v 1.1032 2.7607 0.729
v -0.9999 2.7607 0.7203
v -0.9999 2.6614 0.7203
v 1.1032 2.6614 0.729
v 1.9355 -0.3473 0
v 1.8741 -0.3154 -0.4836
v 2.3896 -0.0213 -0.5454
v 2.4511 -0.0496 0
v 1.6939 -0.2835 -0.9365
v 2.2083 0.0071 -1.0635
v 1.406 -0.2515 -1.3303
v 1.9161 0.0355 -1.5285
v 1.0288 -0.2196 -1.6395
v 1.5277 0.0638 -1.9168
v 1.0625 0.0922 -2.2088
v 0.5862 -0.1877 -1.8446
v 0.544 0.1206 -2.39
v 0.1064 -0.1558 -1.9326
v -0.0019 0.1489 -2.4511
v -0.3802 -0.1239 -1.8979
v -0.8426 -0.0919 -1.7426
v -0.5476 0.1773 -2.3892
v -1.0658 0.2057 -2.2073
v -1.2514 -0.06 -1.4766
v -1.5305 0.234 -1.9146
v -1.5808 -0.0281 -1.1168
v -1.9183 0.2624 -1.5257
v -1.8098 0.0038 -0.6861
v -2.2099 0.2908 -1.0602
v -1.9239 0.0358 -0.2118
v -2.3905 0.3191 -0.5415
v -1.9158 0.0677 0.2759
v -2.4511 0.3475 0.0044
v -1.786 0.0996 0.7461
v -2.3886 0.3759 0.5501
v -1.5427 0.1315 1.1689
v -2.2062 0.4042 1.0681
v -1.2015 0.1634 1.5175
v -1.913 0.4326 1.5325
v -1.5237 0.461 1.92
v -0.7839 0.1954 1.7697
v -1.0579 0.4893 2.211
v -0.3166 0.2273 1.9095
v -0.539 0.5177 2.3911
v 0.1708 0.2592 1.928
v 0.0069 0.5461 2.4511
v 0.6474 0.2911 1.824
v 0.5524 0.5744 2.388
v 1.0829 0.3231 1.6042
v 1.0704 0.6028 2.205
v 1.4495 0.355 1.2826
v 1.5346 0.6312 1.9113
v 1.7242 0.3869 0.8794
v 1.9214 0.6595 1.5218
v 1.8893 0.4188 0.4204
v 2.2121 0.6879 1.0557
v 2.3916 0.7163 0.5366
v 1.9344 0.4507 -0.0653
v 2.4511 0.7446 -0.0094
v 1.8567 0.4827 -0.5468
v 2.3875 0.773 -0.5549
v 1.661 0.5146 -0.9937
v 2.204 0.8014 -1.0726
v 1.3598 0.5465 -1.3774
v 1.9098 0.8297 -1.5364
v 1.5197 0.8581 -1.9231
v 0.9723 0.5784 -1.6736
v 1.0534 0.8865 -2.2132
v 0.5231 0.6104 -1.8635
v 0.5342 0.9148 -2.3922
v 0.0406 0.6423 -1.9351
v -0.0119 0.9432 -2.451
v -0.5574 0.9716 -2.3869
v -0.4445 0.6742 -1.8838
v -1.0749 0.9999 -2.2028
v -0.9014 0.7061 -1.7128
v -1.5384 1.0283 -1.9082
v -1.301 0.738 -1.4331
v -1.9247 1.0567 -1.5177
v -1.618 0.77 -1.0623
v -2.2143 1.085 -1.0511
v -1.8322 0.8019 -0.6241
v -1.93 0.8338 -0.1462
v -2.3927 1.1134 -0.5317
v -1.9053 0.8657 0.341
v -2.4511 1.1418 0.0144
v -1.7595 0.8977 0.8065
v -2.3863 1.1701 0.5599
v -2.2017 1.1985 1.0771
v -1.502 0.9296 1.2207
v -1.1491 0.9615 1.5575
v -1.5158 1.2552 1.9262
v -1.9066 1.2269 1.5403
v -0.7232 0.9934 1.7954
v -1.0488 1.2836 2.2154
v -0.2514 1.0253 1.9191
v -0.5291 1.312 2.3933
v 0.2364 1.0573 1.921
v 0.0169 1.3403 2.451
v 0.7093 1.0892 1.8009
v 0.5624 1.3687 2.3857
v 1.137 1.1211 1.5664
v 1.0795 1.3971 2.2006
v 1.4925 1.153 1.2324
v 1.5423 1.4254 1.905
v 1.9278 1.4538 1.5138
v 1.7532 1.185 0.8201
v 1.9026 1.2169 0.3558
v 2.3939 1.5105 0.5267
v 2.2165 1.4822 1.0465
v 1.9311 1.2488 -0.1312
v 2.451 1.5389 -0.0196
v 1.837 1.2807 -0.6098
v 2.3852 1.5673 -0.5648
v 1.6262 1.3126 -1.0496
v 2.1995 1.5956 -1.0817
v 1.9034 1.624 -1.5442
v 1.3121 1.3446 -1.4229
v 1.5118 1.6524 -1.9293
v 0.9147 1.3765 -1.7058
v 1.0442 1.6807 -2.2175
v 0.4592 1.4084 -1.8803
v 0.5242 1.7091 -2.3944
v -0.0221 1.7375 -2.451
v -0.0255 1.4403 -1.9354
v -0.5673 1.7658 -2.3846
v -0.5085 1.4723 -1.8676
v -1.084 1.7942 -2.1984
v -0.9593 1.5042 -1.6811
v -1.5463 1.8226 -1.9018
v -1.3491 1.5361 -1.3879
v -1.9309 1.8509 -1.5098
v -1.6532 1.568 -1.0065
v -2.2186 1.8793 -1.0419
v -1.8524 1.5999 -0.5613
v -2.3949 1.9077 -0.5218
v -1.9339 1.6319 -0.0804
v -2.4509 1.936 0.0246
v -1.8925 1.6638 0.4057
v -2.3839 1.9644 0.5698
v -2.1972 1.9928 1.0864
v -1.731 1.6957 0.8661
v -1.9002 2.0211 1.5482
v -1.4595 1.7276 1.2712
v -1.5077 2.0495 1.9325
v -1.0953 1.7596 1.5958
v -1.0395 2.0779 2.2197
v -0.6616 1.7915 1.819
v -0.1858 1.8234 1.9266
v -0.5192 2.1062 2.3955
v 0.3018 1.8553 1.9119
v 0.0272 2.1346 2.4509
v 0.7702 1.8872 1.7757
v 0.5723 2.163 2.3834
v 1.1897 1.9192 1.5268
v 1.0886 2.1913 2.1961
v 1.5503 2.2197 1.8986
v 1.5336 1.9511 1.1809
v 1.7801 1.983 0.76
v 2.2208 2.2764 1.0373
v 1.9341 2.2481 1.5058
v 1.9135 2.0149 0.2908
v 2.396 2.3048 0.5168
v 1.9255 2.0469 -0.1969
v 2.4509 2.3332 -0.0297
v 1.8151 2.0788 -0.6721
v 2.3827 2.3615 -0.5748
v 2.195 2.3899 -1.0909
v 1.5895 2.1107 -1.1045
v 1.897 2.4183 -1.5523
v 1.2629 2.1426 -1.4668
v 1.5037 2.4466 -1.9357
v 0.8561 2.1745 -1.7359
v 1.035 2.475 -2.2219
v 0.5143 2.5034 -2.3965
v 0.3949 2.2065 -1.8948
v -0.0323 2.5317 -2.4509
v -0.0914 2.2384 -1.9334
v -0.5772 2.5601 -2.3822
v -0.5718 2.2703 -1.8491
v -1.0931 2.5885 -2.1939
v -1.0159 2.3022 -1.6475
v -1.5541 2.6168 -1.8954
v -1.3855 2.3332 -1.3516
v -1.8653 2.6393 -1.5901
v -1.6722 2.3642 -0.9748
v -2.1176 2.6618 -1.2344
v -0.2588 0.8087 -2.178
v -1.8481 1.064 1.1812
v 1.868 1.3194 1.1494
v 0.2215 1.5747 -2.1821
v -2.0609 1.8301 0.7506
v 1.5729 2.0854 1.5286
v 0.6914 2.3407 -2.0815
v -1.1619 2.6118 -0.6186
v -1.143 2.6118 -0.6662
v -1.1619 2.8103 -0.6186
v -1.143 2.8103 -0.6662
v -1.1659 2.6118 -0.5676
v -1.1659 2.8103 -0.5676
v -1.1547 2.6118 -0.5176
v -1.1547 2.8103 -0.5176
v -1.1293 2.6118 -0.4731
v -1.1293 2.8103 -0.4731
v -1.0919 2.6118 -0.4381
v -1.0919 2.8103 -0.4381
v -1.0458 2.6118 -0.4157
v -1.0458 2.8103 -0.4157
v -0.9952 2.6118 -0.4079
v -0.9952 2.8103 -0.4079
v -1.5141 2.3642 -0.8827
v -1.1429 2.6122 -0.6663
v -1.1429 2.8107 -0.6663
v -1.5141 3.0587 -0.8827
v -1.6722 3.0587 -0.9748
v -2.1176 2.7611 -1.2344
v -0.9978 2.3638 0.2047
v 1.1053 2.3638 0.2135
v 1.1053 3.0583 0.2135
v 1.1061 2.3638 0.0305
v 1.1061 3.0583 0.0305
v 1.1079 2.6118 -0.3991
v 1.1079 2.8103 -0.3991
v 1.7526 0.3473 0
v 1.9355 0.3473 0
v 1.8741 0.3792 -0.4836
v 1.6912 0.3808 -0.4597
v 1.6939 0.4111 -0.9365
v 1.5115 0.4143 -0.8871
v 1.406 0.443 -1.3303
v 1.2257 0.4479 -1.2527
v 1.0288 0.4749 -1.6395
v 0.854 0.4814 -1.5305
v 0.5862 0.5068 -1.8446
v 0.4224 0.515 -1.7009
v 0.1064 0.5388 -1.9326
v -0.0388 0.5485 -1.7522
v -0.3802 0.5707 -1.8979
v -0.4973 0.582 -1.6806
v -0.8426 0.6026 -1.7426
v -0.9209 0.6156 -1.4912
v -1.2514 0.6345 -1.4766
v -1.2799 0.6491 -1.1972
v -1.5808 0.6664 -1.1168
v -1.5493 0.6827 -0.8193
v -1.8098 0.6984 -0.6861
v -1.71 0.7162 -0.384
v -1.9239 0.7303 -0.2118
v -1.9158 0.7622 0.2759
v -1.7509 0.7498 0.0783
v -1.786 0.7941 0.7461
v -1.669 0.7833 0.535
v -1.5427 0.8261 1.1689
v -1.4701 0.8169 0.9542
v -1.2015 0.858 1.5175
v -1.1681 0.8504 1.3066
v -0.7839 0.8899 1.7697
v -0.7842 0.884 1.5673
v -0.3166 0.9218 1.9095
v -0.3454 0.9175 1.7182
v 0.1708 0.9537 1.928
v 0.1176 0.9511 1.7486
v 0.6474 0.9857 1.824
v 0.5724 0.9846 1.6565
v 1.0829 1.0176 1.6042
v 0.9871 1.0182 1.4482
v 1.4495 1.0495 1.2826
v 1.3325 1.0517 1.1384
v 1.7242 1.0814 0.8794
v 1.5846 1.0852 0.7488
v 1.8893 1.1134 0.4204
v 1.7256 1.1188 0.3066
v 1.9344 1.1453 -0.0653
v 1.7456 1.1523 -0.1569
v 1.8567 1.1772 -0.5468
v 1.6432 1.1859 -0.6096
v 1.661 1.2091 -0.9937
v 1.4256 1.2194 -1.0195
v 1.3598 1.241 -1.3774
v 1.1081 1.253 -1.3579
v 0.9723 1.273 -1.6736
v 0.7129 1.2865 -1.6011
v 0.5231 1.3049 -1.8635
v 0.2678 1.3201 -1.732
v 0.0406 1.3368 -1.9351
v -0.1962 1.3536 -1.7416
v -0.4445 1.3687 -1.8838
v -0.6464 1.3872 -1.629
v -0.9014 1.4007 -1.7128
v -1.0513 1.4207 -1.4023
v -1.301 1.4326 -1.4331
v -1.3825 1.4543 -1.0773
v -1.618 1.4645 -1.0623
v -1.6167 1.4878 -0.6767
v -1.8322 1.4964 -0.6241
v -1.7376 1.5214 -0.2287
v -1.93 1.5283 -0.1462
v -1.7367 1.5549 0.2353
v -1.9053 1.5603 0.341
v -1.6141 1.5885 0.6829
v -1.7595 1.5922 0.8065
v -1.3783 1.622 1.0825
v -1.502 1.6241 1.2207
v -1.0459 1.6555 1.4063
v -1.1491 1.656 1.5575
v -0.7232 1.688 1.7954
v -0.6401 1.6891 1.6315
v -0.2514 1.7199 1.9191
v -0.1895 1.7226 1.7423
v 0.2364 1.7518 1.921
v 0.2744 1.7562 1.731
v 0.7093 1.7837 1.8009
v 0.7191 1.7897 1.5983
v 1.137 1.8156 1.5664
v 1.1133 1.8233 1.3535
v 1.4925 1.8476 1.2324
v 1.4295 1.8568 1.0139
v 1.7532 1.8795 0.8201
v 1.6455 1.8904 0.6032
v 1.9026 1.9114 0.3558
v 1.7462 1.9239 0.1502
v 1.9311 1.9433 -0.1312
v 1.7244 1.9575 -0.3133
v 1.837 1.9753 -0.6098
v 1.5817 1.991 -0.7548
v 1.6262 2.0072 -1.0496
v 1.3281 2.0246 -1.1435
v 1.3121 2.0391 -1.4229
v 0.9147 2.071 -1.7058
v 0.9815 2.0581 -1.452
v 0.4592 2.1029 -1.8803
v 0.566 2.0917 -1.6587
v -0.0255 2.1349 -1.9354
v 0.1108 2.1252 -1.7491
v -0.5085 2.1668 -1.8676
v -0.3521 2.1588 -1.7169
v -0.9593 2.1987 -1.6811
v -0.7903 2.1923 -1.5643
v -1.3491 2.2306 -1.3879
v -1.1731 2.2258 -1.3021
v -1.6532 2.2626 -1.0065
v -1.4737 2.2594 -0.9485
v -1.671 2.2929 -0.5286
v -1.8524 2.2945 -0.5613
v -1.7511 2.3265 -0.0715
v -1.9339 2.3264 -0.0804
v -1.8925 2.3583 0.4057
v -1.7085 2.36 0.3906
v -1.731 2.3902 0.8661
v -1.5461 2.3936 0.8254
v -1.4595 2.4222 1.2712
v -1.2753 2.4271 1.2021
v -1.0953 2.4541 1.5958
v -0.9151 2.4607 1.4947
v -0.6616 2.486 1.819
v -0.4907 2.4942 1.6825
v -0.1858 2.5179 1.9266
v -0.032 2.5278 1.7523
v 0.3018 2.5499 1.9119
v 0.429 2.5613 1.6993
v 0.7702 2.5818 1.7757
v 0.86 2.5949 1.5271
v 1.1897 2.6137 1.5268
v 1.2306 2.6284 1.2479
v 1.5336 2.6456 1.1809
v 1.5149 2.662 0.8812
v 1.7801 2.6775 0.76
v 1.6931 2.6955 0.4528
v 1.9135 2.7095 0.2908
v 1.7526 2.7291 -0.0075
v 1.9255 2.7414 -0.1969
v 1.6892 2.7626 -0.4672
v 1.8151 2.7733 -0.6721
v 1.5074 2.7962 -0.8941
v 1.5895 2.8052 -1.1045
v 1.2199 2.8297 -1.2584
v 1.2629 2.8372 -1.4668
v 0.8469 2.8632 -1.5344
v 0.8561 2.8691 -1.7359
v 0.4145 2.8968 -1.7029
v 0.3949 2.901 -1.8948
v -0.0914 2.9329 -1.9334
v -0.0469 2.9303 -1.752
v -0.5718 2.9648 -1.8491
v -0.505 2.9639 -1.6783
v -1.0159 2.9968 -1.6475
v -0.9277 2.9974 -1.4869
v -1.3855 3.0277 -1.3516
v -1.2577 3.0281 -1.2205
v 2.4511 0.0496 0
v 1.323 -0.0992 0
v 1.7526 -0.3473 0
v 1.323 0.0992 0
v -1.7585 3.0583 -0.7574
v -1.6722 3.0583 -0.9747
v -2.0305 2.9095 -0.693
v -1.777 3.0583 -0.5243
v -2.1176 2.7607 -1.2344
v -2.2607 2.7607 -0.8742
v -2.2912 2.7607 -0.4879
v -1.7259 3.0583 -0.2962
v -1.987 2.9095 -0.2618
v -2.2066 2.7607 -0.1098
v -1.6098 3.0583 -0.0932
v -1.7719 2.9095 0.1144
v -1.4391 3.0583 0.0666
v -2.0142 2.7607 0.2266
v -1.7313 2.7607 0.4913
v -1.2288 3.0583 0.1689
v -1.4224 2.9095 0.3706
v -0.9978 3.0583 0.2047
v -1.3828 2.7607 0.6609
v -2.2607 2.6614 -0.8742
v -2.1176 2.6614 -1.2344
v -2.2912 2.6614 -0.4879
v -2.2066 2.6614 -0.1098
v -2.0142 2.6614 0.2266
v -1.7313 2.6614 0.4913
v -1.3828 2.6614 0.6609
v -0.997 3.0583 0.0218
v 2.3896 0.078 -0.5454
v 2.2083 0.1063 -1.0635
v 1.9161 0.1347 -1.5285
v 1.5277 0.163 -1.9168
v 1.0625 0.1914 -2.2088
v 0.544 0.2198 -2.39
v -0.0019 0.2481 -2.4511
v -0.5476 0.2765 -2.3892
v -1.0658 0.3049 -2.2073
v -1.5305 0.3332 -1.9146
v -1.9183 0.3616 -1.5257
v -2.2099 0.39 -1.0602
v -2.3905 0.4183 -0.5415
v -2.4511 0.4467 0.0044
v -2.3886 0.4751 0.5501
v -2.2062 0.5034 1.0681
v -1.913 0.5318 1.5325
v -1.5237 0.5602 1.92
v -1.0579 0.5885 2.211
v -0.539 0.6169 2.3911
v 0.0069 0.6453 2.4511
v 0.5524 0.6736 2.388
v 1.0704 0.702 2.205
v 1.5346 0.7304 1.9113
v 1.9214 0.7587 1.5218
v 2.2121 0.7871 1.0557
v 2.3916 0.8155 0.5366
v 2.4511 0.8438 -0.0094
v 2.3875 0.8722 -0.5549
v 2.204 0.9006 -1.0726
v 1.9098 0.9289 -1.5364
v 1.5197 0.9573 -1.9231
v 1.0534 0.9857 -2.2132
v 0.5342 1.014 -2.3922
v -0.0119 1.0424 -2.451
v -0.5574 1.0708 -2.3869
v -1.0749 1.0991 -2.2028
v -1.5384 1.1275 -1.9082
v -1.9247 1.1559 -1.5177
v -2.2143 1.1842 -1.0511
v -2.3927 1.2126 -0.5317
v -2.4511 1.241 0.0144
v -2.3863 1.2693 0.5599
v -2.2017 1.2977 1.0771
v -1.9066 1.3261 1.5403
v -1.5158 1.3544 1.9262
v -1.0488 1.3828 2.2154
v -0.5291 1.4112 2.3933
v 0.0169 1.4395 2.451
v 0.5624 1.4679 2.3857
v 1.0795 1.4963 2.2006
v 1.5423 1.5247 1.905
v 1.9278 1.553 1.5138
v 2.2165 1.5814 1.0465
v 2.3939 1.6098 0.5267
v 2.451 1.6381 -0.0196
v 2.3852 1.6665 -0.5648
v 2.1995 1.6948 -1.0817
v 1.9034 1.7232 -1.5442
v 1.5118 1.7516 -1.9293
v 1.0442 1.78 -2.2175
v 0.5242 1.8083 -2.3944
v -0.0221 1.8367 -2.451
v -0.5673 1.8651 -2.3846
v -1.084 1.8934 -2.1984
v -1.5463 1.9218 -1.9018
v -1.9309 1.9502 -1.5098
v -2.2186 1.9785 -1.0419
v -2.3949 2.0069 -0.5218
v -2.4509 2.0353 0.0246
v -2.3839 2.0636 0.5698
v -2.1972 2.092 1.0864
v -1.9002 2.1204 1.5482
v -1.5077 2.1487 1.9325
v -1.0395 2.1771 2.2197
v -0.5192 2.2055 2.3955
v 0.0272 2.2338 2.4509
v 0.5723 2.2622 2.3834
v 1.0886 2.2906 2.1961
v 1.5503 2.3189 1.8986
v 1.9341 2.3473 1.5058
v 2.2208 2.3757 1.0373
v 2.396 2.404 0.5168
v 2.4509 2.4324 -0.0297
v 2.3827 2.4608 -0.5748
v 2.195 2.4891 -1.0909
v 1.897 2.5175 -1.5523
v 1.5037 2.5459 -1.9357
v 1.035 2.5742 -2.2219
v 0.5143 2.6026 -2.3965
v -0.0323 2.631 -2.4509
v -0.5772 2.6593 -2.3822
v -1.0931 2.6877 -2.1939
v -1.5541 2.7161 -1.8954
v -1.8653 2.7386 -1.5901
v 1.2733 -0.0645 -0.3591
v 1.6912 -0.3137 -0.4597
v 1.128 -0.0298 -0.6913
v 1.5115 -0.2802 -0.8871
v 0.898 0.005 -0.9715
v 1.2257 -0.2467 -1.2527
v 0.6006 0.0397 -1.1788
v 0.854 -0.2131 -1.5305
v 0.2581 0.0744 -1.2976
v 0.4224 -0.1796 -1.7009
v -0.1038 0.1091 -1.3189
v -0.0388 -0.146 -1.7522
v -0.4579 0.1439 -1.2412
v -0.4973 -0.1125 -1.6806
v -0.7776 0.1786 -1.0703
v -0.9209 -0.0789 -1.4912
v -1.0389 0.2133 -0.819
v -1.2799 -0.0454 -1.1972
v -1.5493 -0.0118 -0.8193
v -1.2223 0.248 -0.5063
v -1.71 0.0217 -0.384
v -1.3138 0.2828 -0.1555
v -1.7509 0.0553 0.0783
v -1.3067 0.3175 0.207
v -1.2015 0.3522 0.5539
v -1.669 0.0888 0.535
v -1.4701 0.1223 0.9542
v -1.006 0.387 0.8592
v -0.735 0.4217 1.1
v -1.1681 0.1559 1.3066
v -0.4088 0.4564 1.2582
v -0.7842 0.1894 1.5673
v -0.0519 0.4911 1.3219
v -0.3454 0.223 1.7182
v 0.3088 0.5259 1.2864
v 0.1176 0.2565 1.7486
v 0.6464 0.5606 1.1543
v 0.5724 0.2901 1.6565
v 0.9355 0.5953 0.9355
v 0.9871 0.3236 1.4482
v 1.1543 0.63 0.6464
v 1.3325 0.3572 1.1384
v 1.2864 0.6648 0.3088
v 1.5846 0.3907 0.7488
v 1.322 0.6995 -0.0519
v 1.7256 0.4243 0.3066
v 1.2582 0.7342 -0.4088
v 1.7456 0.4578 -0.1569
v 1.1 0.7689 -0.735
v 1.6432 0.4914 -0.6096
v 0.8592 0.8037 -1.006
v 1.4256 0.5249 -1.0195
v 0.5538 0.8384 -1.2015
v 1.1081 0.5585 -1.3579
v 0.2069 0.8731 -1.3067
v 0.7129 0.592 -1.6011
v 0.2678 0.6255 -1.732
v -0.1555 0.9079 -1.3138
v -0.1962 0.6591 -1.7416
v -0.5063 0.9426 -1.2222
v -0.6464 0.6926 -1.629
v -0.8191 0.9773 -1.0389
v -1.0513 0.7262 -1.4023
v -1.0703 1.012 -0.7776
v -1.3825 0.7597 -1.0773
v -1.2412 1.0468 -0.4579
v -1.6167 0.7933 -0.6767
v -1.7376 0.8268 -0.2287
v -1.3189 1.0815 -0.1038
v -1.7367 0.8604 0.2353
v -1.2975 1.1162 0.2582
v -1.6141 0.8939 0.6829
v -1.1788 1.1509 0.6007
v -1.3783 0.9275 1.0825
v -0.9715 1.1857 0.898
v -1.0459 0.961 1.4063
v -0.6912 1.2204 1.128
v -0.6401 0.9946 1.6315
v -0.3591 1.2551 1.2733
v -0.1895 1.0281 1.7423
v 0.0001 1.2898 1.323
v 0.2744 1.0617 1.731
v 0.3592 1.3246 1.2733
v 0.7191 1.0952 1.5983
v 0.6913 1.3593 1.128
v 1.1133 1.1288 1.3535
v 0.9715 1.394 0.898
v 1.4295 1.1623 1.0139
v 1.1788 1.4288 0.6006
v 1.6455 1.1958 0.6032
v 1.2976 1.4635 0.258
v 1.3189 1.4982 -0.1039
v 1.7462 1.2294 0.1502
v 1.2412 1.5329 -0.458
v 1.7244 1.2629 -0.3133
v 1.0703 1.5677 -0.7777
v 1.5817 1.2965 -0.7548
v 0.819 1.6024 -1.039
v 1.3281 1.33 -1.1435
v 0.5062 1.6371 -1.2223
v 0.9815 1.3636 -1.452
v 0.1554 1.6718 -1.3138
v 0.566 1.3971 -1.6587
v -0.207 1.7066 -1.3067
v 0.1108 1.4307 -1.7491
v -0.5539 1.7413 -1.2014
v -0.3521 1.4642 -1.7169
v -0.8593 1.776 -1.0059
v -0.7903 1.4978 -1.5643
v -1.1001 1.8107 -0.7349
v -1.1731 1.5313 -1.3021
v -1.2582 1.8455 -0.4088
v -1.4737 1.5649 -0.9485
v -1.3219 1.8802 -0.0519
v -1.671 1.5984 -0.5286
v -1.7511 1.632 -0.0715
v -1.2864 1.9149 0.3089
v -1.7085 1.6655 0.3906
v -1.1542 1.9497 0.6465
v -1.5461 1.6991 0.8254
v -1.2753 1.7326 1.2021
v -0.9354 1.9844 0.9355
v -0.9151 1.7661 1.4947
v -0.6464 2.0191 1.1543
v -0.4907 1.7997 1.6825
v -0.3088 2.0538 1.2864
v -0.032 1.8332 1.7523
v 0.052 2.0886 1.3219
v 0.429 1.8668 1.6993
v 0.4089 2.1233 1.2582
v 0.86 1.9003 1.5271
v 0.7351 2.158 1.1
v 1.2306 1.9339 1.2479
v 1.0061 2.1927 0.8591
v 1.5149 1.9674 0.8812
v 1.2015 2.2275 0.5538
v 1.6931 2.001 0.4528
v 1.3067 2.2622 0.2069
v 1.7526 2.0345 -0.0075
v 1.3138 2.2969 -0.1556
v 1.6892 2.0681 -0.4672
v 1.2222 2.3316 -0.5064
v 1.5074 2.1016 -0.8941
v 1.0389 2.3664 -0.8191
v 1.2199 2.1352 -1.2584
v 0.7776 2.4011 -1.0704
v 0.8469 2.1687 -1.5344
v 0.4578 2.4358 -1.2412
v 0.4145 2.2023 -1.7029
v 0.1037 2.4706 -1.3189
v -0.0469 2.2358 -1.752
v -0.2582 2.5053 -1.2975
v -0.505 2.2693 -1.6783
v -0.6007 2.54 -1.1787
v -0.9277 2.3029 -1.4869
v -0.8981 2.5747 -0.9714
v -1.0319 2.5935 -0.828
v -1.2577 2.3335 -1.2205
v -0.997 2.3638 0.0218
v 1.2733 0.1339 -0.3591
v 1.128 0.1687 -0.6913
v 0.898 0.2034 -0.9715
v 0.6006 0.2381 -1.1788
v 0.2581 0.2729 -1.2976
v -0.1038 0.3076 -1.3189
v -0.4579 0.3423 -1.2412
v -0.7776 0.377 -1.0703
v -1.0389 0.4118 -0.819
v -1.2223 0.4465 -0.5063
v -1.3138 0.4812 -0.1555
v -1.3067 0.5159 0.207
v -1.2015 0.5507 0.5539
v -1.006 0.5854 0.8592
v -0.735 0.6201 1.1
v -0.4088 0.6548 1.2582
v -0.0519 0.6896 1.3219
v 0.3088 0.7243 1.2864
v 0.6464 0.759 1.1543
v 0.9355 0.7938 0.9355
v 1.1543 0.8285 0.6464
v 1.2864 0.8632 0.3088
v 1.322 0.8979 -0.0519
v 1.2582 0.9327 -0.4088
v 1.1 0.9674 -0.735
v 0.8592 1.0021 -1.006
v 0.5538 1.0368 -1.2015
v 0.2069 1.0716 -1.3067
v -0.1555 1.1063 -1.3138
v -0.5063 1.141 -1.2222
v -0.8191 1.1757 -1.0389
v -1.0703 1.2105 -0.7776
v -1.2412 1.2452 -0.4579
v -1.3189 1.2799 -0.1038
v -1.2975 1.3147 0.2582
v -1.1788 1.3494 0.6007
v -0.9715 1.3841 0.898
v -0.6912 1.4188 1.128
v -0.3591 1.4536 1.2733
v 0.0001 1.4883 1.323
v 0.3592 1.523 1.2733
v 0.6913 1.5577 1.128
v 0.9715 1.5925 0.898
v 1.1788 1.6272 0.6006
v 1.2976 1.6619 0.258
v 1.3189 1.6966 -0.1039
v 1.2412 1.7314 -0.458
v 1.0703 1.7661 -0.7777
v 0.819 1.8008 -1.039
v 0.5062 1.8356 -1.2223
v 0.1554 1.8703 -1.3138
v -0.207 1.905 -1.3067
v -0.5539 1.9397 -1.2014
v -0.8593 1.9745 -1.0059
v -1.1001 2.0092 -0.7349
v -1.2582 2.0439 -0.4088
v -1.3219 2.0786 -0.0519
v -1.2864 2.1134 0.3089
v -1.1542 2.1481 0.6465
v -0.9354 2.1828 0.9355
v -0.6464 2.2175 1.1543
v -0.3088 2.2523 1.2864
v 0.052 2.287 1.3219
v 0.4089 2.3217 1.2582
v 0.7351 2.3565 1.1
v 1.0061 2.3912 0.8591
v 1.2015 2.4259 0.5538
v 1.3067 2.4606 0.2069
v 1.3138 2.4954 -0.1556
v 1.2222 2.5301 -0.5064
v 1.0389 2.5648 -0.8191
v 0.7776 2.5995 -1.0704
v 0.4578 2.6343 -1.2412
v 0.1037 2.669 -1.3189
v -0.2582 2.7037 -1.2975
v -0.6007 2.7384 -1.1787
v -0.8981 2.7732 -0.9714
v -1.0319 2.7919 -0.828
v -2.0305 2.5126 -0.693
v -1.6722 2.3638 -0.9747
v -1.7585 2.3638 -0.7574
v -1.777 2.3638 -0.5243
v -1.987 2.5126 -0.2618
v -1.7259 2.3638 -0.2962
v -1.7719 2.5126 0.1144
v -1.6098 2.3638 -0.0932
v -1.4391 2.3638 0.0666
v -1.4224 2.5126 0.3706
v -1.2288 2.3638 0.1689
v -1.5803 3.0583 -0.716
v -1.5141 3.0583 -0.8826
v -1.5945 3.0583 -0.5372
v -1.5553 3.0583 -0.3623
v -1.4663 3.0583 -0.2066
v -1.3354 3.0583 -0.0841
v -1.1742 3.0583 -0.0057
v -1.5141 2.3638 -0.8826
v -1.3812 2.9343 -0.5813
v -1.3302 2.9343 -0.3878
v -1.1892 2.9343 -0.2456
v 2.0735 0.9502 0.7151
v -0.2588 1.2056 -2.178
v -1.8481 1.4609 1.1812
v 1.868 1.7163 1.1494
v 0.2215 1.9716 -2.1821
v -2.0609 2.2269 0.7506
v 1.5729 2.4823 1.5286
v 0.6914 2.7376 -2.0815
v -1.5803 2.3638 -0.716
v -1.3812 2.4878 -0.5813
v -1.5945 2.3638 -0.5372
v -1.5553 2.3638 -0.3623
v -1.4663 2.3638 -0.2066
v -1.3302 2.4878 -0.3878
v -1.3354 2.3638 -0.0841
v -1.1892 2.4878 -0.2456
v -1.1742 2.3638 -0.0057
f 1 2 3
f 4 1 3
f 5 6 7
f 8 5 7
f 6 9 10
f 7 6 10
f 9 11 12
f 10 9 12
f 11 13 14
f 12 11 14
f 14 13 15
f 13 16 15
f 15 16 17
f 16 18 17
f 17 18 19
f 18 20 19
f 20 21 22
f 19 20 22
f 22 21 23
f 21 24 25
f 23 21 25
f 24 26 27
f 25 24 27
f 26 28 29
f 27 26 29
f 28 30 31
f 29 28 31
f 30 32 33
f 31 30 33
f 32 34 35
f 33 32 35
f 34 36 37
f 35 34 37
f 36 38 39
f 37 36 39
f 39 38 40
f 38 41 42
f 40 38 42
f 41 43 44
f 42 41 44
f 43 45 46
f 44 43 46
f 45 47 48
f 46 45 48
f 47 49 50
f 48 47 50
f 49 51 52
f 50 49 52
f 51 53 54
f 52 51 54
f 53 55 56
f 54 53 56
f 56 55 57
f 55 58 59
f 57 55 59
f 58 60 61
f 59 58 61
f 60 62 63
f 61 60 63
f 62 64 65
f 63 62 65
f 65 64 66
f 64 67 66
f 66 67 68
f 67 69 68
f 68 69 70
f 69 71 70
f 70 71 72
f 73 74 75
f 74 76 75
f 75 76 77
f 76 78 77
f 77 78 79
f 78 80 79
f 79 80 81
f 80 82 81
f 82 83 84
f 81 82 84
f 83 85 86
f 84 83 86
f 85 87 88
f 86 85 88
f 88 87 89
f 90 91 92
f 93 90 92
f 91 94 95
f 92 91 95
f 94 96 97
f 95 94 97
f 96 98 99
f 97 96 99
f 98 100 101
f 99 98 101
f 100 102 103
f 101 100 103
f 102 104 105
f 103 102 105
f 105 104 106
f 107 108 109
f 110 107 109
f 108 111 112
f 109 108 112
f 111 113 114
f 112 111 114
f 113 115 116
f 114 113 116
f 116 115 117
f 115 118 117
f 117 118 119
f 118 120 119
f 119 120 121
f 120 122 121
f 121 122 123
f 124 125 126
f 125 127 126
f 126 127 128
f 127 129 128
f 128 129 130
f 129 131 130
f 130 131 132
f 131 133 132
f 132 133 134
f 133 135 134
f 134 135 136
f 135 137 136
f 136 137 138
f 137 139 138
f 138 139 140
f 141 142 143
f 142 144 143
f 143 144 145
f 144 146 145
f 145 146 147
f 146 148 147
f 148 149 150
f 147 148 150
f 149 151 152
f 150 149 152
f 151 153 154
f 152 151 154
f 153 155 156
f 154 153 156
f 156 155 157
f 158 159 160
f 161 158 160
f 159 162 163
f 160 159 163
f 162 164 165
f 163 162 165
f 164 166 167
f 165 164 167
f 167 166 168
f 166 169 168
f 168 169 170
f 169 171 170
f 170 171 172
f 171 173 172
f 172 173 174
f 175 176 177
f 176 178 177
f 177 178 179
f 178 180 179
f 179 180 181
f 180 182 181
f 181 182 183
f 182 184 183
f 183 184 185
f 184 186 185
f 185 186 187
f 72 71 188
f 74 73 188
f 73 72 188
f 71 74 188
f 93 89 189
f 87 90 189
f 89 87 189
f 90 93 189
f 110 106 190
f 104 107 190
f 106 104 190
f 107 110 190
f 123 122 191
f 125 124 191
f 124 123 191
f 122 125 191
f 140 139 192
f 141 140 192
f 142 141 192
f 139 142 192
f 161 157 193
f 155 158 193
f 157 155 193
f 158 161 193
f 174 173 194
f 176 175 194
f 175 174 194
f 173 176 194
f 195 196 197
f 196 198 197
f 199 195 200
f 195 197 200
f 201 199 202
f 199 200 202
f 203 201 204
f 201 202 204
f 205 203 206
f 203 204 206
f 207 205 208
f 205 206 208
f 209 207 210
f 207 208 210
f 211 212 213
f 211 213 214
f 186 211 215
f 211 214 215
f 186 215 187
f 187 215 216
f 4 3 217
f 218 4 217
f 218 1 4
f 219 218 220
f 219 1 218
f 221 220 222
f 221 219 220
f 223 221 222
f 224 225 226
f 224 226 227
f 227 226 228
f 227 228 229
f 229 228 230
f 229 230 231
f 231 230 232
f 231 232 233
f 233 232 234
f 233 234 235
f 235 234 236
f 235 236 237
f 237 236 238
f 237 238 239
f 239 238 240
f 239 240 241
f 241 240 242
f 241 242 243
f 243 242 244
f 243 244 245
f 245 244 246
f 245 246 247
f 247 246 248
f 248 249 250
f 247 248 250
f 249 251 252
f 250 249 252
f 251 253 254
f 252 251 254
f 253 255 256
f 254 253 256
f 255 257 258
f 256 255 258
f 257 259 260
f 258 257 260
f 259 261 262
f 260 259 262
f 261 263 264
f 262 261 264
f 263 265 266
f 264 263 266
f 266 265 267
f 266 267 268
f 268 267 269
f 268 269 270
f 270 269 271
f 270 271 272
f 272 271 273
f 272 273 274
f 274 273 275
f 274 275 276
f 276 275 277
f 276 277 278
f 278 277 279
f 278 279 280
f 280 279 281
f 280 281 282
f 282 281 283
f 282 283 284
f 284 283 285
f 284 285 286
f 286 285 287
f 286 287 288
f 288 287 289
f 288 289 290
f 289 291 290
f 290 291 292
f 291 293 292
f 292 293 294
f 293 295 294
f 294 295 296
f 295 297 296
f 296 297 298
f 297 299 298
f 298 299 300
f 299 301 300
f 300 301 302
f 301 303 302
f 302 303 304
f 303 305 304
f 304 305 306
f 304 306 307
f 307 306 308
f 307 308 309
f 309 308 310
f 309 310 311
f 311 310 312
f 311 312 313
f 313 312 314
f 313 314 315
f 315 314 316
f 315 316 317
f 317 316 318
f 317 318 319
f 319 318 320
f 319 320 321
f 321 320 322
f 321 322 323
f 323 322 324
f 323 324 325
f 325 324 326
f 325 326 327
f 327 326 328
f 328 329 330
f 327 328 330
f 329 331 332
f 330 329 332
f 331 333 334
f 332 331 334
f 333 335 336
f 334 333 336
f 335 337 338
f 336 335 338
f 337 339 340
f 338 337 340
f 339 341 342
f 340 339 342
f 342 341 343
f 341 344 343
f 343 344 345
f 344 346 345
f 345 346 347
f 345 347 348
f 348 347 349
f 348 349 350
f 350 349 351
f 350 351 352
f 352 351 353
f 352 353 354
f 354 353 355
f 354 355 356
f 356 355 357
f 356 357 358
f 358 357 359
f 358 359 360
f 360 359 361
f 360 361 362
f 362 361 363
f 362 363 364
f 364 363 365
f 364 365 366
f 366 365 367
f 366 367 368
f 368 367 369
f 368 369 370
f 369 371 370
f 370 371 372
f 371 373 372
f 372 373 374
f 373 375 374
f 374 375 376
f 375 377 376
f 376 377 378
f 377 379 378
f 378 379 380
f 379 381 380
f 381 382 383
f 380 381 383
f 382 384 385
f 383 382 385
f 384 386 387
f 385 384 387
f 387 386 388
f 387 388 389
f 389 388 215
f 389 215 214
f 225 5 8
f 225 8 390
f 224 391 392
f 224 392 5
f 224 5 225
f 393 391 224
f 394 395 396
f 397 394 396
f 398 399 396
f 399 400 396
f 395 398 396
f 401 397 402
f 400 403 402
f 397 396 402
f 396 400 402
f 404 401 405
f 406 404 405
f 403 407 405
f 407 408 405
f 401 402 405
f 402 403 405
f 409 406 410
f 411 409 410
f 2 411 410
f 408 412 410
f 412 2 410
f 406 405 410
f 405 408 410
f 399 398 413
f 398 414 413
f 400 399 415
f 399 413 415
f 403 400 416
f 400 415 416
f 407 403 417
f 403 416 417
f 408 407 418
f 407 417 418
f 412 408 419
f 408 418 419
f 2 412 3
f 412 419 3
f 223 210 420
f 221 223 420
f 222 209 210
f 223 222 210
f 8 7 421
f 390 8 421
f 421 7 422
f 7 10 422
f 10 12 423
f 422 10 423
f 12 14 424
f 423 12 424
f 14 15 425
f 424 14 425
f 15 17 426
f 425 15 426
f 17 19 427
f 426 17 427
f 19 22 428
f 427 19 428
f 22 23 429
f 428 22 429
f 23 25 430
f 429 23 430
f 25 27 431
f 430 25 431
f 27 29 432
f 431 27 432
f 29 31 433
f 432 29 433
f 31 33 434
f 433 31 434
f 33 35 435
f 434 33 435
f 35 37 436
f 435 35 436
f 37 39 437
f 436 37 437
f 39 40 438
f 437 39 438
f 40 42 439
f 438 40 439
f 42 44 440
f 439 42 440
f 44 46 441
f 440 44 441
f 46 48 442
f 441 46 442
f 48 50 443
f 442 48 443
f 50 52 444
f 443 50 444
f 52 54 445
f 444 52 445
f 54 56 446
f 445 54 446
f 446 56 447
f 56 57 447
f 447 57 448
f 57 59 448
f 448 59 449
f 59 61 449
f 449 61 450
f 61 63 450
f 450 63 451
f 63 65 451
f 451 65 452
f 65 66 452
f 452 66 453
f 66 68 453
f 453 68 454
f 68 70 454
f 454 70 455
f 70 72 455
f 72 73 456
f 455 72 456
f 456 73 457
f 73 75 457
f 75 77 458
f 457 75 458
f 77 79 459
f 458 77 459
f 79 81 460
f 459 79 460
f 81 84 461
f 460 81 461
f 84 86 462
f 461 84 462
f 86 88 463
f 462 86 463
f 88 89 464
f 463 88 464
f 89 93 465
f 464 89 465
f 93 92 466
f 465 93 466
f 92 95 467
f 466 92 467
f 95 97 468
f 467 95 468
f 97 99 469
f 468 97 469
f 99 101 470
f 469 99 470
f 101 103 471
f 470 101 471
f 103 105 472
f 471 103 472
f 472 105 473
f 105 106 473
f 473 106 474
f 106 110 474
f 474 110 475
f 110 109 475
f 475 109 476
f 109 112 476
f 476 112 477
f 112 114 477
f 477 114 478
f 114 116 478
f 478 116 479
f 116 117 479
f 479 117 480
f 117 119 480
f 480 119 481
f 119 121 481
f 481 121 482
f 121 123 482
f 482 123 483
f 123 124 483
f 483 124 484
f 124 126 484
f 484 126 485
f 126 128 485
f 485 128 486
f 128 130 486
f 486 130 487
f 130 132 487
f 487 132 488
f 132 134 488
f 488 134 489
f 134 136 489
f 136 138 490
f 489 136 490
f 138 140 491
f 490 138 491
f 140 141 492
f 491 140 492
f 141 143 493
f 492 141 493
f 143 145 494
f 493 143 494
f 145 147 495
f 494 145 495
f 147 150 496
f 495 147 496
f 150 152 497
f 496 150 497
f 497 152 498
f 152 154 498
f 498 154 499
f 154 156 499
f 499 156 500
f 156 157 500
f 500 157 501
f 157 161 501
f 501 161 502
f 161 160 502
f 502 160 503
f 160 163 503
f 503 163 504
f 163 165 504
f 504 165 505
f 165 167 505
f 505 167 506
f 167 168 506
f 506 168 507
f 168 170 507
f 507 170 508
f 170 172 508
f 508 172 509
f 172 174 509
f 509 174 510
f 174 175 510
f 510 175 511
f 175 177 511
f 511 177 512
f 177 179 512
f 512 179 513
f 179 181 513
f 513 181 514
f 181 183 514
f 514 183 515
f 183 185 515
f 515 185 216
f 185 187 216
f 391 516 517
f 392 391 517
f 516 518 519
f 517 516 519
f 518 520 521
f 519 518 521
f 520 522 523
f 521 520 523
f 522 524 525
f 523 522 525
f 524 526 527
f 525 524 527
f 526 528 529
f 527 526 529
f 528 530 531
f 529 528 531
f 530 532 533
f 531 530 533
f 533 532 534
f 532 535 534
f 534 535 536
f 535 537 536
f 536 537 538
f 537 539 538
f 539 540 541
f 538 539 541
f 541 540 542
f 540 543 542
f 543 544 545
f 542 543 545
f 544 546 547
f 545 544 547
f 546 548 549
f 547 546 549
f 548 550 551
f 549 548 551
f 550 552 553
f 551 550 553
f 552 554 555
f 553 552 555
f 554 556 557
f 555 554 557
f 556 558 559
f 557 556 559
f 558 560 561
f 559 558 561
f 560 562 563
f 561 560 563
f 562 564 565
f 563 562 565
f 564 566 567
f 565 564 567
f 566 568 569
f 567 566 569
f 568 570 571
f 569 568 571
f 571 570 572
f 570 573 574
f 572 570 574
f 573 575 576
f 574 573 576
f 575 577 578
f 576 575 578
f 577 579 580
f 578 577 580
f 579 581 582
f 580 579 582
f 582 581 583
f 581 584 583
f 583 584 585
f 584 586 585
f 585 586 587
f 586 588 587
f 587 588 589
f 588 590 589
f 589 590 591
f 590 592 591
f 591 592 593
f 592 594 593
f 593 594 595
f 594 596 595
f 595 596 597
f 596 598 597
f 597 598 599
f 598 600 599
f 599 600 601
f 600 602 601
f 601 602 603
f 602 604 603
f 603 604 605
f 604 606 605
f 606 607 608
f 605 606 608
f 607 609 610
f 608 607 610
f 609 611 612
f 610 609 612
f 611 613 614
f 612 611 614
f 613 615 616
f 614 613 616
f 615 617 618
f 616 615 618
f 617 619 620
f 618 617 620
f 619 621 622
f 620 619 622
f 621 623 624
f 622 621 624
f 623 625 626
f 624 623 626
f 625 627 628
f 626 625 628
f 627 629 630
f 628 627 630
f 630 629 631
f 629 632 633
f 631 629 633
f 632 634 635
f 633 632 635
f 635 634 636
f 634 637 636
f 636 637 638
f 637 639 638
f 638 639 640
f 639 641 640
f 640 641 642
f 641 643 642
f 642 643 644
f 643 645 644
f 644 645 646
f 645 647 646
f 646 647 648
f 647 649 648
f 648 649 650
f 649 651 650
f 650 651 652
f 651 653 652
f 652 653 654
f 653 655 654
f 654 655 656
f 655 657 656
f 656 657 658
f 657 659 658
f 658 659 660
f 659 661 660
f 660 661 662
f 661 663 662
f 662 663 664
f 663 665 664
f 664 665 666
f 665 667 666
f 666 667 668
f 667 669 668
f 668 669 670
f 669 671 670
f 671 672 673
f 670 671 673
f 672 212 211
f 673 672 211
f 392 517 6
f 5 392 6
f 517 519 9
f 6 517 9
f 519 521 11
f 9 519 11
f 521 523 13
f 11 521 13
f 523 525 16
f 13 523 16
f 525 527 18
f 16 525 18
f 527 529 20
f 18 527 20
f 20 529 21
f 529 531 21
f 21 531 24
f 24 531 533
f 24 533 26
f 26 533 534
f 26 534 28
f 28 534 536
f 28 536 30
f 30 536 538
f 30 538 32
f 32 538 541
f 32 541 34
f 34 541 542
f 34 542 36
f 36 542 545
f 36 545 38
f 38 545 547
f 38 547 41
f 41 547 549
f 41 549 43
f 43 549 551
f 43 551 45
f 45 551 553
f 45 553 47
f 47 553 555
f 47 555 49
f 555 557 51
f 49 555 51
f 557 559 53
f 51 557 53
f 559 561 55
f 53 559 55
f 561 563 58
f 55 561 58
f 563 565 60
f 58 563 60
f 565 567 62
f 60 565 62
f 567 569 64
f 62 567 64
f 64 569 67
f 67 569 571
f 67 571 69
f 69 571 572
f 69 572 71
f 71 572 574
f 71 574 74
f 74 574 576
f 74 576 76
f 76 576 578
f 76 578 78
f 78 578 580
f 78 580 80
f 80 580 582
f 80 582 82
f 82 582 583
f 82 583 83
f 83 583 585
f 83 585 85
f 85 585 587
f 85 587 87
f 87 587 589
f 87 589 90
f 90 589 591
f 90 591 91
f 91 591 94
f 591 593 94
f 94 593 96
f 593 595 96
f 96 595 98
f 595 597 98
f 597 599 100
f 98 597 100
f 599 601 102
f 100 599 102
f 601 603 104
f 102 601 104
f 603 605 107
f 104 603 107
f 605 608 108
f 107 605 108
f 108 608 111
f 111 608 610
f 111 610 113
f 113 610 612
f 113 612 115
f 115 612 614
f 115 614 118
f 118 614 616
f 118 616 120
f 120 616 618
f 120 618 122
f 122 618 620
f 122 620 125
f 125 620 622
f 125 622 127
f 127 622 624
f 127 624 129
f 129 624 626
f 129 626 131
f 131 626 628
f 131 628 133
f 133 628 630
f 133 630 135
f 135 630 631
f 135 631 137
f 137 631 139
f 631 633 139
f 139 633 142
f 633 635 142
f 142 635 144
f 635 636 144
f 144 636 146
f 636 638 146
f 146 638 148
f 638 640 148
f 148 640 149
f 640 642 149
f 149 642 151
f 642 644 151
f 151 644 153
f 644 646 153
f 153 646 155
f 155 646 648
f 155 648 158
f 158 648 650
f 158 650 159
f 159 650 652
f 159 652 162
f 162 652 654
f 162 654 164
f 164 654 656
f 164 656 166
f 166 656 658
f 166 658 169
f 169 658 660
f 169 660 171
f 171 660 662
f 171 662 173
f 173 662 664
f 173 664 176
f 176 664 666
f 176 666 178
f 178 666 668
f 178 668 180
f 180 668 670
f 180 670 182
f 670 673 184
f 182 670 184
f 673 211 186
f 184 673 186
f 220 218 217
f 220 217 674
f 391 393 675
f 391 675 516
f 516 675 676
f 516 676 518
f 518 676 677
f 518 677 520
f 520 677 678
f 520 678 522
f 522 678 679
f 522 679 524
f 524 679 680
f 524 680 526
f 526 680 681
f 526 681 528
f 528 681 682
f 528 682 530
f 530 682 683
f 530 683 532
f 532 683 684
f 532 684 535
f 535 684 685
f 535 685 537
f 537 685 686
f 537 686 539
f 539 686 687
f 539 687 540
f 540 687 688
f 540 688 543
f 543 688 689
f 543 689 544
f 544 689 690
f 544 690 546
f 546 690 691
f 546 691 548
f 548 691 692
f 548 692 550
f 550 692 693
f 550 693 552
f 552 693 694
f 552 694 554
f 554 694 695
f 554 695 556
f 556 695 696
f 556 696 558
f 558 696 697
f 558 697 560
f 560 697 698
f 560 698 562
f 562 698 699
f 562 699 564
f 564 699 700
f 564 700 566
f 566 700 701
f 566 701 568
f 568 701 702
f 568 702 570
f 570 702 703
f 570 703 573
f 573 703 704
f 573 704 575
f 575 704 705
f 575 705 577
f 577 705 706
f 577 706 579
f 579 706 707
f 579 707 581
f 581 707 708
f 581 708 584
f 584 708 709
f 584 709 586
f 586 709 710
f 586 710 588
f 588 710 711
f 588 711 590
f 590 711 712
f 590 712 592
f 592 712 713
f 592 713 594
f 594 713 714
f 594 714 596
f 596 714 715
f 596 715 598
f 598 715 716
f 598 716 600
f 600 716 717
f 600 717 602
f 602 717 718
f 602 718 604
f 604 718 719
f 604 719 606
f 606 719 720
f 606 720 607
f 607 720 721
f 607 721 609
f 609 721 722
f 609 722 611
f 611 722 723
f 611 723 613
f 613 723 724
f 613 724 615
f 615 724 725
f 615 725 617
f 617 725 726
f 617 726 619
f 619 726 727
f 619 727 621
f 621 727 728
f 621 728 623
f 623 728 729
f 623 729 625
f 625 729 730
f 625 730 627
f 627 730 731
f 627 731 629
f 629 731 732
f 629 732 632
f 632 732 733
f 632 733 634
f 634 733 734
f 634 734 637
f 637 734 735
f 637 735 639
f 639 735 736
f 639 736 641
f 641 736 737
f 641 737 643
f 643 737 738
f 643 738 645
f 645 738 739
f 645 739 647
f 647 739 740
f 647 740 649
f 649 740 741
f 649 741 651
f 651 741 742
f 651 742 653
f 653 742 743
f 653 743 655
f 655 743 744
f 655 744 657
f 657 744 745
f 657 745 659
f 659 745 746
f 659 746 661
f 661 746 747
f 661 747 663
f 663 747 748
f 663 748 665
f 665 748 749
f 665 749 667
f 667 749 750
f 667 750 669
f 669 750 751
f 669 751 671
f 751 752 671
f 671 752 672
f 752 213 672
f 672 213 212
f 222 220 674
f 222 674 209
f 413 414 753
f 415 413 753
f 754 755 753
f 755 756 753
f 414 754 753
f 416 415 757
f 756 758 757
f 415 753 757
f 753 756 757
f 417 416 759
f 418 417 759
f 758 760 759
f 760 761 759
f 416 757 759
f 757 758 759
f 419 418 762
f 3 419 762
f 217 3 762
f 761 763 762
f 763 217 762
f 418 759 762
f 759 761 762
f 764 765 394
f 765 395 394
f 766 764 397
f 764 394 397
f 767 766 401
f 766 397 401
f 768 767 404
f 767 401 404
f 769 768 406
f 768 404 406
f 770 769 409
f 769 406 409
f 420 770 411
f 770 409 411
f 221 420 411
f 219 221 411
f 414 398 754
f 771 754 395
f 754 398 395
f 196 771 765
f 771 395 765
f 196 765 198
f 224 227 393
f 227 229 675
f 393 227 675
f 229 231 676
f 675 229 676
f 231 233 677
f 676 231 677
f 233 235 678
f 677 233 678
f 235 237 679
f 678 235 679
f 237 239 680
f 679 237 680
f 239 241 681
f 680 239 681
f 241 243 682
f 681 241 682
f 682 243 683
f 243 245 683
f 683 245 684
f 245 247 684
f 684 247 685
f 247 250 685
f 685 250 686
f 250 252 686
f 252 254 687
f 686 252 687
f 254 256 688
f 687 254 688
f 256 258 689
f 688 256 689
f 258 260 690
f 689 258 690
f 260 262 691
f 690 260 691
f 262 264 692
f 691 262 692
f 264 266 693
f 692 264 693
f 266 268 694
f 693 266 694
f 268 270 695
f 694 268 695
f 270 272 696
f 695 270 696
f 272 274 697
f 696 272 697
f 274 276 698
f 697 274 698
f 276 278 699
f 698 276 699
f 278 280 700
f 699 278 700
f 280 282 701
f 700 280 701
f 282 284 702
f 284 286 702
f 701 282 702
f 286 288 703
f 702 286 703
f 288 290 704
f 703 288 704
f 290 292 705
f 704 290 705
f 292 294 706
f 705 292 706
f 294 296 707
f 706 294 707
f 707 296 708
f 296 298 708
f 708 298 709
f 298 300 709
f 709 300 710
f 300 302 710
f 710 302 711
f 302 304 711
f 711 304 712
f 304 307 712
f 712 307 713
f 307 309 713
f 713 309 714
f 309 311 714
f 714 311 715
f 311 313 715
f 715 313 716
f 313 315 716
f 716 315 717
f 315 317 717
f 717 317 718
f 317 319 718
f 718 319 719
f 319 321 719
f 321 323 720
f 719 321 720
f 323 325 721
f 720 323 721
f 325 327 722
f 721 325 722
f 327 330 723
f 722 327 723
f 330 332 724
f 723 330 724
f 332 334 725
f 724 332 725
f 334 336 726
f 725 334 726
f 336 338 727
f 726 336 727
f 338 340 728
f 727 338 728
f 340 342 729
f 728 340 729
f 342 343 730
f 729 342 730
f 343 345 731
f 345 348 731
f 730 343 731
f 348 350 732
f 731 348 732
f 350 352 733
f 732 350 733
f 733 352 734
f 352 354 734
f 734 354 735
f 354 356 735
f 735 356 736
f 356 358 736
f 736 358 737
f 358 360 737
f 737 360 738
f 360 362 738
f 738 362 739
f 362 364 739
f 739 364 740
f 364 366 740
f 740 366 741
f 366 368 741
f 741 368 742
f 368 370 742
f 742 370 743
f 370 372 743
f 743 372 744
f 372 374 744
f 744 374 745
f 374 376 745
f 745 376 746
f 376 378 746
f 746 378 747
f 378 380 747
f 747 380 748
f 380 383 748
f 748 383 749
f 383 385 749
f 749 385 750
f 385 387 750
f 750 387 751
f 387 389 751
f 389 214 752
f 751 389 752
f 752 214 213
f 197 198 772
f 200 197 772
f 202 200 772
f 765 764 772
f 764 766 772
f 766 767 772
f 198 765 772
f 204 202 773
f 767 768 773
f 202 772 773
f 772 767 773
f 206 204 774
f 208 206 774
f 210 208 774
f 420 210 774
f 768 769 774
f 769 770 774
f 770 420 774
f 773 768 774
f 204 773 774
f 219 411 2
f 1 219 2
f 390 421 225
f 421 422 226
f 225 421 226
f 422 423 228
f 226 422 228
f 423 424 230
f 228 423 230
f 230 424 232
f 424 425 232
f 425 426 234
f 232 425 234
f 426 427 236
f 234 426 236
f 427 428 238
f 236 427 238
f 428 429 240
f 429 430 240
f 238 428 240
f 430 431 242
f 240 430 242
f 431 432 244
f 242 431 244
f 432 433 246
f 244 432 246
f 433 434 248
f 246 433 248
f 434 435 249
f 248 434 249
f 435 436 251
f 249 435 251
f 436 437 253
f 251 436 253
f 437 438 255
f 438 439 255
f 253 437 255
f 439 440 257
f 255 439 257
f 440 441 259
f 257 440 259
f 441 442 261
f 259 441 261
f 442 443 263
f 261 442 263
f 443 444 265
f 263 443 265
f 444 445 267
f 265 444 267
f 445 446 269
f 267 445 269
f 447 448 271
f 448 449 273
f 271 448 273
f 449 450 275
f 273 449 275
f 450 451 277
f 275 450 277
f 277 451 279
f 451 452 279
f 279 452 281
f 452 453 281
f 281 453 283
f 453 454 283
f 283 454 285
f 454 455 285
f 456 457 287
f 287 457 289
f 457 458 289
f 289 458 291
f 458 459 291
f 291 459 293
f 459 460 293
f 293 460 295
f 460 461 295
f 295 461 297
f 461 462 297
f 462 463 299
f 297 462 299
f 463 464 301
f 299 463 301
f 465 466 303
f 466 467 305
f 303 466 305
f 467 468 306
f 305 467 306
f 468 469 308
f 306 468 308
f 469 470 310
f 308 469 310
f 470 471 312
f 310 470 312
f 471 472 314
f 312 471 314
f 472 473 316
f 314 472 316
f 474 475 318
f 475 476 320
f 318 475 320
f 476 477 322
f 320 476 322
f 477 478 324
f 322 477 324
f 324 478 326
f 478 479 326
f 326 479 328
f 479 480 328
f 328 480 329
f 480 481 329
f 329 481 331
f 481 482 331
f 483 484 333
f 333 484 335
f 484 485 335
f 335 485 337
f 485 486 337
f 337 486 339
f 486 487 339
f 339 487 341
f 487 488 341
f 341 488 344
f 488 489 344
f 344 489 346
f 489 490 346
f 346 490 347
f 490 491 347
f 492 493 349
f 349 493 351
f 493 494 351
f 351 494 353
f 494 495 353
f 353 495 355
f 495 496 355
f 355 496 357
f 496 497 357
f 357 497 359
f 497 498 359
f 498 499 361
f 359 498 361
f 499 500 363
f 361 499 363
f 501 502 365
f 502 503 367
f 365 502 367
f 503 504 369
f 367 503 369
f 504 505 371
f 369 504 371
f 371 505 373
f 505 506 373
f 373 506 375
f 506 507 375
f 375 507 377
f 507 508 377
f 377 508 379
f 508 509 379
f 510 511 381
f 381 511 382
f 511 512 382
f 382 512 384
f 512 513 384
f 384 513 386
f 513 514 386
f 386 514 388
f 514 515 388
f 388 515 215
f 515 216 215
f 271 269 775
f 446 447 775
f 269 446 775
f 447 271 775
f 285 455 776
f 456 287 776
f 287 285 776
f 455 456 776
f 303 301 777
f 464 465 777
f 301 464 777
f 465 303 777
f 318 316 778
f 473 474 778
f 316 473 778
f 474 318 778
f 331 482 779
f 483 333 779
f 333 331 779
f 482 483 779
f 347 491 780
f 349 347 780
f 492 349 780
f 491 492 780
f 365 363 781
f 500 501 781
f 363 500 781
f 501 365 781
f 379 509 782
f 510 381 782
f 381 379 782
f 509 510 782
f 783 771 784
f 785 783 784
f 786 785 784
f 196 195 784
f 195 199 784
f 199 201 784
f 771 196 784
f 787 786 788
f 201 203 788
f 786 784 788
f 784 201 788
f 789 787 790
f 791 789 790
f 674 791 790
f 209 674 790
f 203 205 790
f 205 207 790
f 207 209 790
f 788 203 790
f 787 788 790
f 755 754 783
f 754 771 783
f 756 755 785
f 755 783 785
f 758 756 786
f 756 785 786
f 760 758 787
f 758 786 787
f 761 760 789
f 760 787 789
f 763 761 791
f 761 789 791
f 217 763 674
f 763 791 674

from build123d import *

# Parameters (mm, degrees)
SWEEP1_PITCH       = 0.79375
SWEEP1_HEIGHT      = 2.71145
SWEEP1_RADIUS      = 1.7526
SWEEP1_START_ANGLE = 90
REVOLVE1_ANGLE     = 120
EXTRUDE1_DEPTH     = 2.10312


with BuildPart() as part:
    # Sweep1: sweep along a helix
    with BuildLine() as sweep1_path:
        add(Helix(SWEEP1_PITCH, SWEEP1_HEIGHT, SWEEP1_RADIUS, center=(0, 0, 0), direction=(0, 1, 0), mode=Mode.PRIVATE).rotate(Axis((0, 0, 0), (0, 1, 0)), SWEEP1_START_ANGLE))
    # Sketch1 → Sweep1 (sweep)
    with BuildSketch(Plane(origin=(0, 0, 0), x_dir=(-1, 0, 0), z_dir=(0, 0, 1))):
        Polygon((-2.4511, -0.049609375), (-1.935544252, -0.347265625), (-1.7526, -0.347265625), (-1.32297021, -0.09921875), (-1.32297021, 0.09921875), (-1.7526, 0.347265625), (-1.935544252, 0.347265625), (-2.4511, 0.049609375), align=None)
    sweep(path=sweep1_path.line, is_frenet=True)


with BuildPart() as body_2:
    # Sketch3 → Revolve1 (revolve)
    with BuildSketch(Plane(origin=(0, 0, 0), x_dir=(0.863937822, 0, 0.503598491), z_dir=(-0.503598491, 0, 0.863937822))):
        Polygon((-1.7526, 2.363793834), (-1.32297021, 2.611841495), (-1.32297021, 2.810278209), (-1.7526, 3.058323921), (-1.935544251, 3.058323273), (-2.451099999, 2.760667023), (-2.4511, 2.661448597), (-1.935544252, 2.363793048), align=None)
    revolve(axis=Axis((-0.994495107, 2.711060242, -0.579701713), (0, 1, 0)), revolution_arc=REVOLVE1_ANGLE)

    # Sketch4 → Extrude1 (add)
    with BuildSketch(Plane(origin=(-0.996889536, 0, -0.004147271), x_dir=(0.004160175, 0, -0.999991346), z_dir=(0.999991346, 0, 0.004160175))):
        with BuildLine():
            Line((-0.208865986, 2.363793047), (-0.025921734, 2.363793833))
            Line((-0.025921734, 2.363793833), (0.403708056, 2.611841495))
            Line((0.403708056, 2.611841495), (0.403708056, 2.810278209))
            Line((0.403708056, 2.810278209), (-0.025921734, 3.05832392))
            add(Edge.make_bspline(
                [(-0.025921734, 3.05832392), (-0.208865986, 3.058323273)],
                knots=[0, 0, 1, 1], degree=1))
            Line((-0.208865986, 3.058323273), (-0.724421734, 2.760667022))
            Line((-0.724421734, 2.760667022), (-0.724421734, 2.661448596))
            Line((-0.724421734, 2.661448596), (-0.208865986, 2.363793047))
        make_face()
    extrude(amount=EXTRUDE1_DEPTH)


solid = Compound([part.part, body_2.part])
